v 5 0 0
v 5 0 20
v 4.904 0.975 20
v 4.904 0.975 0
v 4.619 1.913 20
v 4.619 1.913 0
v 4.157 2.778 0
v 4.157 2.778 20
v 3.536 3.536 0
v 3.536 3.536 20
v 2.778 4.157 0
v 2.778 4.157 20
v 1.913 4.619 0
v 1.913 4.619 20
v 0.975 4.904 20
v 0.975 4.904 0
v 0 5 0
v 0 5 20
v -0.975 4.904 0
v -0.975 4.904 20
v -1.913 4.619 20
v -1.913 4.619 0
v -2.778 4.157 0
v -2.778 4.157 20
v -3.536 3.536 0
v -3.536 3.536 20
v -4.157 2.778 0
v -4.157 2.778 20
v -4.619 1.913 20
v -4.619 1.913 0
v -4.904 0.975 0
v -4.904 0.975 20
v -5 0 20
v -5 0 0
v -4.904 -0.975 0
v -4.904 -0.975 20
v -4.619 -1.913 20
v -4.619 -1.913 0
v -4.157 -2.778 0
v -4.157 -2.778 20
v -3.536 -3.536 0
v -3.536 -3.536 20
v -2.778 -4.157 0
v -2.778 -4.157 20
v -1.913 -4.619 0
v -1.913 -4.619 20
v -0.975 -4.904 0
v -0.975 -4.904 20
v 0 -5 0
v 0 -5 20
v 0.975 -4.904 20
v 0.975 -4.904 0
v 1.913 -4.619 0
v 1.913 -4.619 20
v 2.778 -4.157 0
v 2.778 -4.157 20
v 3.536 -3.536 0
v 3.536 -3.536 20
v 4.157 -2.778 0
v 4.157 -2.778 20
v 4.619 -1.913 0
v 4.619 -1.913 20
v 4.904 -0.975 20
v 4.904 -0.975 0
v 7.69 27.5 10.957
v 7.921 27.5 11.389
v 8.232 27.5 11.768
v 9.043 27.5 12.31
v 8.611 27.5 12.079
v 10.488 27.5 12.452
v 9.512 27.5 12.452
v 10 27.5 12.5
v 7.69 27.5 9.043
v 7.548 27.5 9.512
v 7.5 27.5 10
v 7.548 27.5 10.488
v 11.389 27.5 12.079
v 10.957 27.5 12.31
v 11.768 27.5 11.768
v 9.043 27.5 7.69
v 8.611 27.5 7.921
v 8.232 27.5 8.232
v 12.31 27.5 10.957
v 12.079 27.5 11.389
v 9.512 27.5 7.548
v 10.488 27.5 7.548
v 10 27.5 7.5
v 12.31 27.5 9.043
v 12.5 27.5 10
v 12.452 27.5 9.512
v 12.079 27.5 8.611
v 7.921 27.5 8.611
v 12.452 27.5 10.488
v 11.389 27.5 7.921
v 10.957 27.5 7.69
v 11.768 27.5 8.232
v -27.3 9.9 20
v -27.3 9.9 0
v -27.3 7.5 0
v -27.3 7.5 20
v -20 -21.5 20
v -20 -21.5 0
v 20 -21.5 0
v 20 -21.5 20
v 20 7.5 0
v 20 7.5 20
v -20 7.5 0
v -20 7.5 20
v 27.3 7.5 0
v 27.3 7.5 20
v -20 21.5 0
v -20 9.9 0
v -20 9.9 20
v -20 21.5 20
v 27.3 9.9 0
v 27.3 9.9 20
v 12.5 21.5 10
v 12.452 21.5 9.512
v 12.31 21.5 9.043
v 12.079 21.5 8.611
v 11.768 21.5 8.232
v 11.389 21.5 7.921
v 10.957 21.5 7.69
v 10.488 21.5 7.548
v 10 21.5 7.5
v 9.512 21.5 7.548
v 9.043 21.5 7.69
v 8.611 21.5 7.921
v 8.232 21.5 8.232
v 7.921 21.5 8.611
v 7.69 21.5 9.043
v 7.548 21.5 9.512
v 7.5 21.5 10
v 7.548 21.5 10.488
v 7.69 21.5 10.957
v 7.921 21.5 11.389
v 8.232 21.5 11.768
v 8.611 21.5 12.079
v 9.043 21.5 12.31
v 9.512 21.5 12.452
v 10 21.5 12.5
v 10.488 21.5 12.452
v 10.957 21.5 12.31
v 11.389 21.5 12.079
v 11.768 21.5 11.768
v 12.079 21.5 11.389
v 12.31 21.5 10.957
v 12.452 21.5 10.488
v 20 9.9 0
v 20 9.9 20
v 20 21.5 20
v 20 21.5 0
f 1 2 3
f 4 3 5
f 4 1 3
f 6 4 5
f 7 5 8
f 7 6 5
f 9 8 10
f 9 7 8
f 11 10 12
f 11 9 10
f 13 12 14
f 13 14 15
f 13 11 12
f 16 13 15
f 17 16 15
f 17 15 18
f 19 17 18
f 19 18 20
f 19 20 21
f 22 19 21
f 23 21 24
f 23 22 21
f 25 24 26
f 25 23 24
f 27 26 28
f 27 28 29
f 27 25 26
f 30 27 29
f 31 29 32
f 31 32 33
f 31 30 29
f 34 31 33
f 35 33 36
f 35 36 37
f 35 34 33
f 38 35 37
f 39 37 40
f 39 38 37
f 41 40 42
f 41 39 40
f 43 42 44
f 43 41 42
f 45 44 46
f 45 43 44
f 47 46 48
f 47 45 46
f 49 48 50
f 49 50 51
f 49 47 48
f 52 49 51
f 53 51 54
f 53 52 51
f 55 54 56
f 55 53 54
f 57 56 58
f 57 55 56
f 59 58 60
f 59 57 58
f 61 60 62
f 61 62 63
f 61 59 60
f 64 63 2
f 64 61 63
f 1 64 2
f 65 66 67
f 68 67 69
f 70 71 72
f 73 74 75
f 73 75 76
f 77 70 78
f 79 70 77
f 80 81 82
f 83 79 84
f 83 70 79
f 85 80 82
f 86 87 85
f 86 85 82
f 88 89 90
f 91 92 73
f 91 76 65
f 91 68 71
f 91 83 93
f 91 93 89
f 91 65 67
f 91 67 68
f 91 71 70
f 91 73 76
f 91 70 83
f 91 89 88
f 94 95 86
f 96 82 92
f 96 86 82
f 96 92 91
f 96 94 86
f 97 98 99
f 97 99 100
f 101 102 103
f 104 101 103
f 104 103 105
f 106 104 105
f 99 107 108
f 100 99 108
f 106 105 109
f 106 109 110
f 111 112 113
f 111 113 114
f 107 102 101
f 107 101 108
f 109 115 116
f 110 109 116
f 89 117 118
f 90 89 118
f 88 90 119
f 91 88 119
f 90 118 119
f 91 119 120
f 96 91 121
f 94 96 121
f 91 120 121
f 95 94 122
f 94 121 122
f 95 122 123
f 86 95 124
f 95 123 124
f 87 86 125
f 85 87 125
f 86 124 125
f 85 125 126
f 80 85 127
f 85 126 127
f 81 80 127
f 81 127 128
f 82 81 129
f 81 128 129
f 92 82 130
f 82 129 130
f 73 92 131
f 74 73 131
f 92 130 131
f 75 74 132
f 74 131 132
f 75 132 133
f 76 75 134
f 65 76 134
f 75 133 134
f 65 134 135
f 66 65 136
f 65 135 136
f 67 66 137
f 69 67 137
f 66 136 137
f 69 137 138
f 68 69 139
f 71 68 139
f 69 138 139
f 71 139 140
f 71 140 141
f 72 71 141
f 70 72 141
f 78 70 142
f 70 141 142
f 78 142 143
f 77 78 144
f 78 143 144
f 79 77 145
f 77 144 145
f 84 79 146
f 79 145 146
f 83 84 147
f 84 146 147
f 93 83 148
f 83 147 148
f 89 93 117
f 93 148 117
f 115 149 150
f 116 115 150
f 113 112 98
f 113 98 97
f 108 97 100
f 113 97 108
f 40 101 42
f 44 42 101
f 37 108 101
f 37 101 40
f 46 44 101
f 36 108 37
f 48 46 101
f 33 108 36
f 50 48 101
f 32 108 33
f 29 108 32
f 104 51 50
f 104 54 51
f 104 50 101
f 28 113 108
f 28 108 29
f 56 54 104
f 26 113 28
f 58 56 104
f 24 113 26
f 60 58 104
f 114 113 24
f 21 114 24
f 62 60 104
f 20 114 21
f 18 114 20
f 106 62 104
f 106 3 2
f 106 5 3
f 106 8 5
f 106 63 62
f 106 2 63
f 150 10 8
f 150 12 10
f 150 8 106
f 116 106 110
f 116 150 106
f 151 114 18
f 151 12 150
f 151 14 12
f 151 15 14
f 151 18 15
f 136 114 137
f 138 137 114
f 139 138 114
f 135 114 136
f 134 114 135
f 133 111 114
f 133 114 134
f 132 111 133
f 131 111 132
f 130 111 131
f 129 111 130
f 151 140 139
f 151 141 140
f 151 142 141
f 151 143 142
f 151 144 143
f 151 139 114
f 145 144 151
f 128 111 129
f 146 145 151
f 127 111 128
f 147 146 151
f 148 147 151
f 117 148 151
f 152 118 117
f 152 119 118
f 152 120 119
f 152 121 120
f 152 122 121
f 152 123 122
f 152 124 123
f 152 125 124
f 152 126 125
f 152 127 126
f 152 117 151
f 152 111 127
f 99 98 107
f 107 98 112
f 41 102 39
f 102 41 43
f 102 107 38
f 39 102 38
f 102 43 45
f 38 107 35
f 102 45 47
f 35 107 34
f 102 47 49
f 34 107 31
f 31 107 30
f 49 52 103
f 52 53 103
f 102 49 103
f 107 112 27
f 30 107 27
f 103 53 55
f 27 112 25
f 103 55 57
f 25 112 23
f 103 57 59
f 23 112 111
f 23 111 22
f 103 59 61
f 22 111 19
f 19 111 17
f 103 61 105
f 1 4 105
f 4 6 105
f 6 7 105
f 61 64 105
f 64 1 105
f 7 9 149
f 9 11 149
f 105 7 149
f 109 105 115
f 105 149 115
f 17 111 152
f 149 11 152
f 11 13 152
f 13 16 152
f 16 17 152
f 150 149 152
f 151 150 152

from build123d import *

# Parameters (mm, degrees)
SKETCH1_W           = 40
SKETCH1_H           = 43
SKETCH1_R           = 5
BOSS_EXTRUDE1_DEPTH = 20
SKETCH2_R           = 2.5
BOSS_EXTRUDE2_DEPTH = 6
SKETCH3_W           = 20
SKETCH3_H           = 2.4
BOSS_EXTRUDE3_DEPTH = 7.3


with BuildPart() as part:
    # Sketch1 → Boss-Extrude1 (new body)
    with BuildSketch(Plane.XY):
        Rectangle(SKETCH1_W, SKETCH1_H)
        Circle(SKETCH1_R, mode=Mode.SUBTRACT)
    extrude(amount=BOSS_EXTRUDE1_DEPTH)

    # Sketch2 → Boss-Extrude2 (add)
    with BuildSketch(Plane(origin=(0, 21.5, 0), x_dir=(1, 0, 0), z_dir=(0, 1, 0))):
        with Locations((10, -10)):
            Circle(SKETCH2_R)
    extrude(amount=BOSS_EXTRUDE2_DEPTH)

    # Sketch3 → Boss-Extrude3 (add)
    with BuildSketch(Plane.ZY.offset(20)):
        with Locations((10, 8.7)):
            Rectangle(SKETCH3_W, SKETCH3_H)
    boss_extrude3 = extrude(amount=BOSS_EXTRUDE3_DEPTH)

    # Mirror1: Boss-Extrude3 across plane
    add(boss_extrude3.mirror(Plane(origin=(0, 0, 0), x_dir=(0, 0, 1), z_dir=(1, 0, 0))))


solid = part.part
